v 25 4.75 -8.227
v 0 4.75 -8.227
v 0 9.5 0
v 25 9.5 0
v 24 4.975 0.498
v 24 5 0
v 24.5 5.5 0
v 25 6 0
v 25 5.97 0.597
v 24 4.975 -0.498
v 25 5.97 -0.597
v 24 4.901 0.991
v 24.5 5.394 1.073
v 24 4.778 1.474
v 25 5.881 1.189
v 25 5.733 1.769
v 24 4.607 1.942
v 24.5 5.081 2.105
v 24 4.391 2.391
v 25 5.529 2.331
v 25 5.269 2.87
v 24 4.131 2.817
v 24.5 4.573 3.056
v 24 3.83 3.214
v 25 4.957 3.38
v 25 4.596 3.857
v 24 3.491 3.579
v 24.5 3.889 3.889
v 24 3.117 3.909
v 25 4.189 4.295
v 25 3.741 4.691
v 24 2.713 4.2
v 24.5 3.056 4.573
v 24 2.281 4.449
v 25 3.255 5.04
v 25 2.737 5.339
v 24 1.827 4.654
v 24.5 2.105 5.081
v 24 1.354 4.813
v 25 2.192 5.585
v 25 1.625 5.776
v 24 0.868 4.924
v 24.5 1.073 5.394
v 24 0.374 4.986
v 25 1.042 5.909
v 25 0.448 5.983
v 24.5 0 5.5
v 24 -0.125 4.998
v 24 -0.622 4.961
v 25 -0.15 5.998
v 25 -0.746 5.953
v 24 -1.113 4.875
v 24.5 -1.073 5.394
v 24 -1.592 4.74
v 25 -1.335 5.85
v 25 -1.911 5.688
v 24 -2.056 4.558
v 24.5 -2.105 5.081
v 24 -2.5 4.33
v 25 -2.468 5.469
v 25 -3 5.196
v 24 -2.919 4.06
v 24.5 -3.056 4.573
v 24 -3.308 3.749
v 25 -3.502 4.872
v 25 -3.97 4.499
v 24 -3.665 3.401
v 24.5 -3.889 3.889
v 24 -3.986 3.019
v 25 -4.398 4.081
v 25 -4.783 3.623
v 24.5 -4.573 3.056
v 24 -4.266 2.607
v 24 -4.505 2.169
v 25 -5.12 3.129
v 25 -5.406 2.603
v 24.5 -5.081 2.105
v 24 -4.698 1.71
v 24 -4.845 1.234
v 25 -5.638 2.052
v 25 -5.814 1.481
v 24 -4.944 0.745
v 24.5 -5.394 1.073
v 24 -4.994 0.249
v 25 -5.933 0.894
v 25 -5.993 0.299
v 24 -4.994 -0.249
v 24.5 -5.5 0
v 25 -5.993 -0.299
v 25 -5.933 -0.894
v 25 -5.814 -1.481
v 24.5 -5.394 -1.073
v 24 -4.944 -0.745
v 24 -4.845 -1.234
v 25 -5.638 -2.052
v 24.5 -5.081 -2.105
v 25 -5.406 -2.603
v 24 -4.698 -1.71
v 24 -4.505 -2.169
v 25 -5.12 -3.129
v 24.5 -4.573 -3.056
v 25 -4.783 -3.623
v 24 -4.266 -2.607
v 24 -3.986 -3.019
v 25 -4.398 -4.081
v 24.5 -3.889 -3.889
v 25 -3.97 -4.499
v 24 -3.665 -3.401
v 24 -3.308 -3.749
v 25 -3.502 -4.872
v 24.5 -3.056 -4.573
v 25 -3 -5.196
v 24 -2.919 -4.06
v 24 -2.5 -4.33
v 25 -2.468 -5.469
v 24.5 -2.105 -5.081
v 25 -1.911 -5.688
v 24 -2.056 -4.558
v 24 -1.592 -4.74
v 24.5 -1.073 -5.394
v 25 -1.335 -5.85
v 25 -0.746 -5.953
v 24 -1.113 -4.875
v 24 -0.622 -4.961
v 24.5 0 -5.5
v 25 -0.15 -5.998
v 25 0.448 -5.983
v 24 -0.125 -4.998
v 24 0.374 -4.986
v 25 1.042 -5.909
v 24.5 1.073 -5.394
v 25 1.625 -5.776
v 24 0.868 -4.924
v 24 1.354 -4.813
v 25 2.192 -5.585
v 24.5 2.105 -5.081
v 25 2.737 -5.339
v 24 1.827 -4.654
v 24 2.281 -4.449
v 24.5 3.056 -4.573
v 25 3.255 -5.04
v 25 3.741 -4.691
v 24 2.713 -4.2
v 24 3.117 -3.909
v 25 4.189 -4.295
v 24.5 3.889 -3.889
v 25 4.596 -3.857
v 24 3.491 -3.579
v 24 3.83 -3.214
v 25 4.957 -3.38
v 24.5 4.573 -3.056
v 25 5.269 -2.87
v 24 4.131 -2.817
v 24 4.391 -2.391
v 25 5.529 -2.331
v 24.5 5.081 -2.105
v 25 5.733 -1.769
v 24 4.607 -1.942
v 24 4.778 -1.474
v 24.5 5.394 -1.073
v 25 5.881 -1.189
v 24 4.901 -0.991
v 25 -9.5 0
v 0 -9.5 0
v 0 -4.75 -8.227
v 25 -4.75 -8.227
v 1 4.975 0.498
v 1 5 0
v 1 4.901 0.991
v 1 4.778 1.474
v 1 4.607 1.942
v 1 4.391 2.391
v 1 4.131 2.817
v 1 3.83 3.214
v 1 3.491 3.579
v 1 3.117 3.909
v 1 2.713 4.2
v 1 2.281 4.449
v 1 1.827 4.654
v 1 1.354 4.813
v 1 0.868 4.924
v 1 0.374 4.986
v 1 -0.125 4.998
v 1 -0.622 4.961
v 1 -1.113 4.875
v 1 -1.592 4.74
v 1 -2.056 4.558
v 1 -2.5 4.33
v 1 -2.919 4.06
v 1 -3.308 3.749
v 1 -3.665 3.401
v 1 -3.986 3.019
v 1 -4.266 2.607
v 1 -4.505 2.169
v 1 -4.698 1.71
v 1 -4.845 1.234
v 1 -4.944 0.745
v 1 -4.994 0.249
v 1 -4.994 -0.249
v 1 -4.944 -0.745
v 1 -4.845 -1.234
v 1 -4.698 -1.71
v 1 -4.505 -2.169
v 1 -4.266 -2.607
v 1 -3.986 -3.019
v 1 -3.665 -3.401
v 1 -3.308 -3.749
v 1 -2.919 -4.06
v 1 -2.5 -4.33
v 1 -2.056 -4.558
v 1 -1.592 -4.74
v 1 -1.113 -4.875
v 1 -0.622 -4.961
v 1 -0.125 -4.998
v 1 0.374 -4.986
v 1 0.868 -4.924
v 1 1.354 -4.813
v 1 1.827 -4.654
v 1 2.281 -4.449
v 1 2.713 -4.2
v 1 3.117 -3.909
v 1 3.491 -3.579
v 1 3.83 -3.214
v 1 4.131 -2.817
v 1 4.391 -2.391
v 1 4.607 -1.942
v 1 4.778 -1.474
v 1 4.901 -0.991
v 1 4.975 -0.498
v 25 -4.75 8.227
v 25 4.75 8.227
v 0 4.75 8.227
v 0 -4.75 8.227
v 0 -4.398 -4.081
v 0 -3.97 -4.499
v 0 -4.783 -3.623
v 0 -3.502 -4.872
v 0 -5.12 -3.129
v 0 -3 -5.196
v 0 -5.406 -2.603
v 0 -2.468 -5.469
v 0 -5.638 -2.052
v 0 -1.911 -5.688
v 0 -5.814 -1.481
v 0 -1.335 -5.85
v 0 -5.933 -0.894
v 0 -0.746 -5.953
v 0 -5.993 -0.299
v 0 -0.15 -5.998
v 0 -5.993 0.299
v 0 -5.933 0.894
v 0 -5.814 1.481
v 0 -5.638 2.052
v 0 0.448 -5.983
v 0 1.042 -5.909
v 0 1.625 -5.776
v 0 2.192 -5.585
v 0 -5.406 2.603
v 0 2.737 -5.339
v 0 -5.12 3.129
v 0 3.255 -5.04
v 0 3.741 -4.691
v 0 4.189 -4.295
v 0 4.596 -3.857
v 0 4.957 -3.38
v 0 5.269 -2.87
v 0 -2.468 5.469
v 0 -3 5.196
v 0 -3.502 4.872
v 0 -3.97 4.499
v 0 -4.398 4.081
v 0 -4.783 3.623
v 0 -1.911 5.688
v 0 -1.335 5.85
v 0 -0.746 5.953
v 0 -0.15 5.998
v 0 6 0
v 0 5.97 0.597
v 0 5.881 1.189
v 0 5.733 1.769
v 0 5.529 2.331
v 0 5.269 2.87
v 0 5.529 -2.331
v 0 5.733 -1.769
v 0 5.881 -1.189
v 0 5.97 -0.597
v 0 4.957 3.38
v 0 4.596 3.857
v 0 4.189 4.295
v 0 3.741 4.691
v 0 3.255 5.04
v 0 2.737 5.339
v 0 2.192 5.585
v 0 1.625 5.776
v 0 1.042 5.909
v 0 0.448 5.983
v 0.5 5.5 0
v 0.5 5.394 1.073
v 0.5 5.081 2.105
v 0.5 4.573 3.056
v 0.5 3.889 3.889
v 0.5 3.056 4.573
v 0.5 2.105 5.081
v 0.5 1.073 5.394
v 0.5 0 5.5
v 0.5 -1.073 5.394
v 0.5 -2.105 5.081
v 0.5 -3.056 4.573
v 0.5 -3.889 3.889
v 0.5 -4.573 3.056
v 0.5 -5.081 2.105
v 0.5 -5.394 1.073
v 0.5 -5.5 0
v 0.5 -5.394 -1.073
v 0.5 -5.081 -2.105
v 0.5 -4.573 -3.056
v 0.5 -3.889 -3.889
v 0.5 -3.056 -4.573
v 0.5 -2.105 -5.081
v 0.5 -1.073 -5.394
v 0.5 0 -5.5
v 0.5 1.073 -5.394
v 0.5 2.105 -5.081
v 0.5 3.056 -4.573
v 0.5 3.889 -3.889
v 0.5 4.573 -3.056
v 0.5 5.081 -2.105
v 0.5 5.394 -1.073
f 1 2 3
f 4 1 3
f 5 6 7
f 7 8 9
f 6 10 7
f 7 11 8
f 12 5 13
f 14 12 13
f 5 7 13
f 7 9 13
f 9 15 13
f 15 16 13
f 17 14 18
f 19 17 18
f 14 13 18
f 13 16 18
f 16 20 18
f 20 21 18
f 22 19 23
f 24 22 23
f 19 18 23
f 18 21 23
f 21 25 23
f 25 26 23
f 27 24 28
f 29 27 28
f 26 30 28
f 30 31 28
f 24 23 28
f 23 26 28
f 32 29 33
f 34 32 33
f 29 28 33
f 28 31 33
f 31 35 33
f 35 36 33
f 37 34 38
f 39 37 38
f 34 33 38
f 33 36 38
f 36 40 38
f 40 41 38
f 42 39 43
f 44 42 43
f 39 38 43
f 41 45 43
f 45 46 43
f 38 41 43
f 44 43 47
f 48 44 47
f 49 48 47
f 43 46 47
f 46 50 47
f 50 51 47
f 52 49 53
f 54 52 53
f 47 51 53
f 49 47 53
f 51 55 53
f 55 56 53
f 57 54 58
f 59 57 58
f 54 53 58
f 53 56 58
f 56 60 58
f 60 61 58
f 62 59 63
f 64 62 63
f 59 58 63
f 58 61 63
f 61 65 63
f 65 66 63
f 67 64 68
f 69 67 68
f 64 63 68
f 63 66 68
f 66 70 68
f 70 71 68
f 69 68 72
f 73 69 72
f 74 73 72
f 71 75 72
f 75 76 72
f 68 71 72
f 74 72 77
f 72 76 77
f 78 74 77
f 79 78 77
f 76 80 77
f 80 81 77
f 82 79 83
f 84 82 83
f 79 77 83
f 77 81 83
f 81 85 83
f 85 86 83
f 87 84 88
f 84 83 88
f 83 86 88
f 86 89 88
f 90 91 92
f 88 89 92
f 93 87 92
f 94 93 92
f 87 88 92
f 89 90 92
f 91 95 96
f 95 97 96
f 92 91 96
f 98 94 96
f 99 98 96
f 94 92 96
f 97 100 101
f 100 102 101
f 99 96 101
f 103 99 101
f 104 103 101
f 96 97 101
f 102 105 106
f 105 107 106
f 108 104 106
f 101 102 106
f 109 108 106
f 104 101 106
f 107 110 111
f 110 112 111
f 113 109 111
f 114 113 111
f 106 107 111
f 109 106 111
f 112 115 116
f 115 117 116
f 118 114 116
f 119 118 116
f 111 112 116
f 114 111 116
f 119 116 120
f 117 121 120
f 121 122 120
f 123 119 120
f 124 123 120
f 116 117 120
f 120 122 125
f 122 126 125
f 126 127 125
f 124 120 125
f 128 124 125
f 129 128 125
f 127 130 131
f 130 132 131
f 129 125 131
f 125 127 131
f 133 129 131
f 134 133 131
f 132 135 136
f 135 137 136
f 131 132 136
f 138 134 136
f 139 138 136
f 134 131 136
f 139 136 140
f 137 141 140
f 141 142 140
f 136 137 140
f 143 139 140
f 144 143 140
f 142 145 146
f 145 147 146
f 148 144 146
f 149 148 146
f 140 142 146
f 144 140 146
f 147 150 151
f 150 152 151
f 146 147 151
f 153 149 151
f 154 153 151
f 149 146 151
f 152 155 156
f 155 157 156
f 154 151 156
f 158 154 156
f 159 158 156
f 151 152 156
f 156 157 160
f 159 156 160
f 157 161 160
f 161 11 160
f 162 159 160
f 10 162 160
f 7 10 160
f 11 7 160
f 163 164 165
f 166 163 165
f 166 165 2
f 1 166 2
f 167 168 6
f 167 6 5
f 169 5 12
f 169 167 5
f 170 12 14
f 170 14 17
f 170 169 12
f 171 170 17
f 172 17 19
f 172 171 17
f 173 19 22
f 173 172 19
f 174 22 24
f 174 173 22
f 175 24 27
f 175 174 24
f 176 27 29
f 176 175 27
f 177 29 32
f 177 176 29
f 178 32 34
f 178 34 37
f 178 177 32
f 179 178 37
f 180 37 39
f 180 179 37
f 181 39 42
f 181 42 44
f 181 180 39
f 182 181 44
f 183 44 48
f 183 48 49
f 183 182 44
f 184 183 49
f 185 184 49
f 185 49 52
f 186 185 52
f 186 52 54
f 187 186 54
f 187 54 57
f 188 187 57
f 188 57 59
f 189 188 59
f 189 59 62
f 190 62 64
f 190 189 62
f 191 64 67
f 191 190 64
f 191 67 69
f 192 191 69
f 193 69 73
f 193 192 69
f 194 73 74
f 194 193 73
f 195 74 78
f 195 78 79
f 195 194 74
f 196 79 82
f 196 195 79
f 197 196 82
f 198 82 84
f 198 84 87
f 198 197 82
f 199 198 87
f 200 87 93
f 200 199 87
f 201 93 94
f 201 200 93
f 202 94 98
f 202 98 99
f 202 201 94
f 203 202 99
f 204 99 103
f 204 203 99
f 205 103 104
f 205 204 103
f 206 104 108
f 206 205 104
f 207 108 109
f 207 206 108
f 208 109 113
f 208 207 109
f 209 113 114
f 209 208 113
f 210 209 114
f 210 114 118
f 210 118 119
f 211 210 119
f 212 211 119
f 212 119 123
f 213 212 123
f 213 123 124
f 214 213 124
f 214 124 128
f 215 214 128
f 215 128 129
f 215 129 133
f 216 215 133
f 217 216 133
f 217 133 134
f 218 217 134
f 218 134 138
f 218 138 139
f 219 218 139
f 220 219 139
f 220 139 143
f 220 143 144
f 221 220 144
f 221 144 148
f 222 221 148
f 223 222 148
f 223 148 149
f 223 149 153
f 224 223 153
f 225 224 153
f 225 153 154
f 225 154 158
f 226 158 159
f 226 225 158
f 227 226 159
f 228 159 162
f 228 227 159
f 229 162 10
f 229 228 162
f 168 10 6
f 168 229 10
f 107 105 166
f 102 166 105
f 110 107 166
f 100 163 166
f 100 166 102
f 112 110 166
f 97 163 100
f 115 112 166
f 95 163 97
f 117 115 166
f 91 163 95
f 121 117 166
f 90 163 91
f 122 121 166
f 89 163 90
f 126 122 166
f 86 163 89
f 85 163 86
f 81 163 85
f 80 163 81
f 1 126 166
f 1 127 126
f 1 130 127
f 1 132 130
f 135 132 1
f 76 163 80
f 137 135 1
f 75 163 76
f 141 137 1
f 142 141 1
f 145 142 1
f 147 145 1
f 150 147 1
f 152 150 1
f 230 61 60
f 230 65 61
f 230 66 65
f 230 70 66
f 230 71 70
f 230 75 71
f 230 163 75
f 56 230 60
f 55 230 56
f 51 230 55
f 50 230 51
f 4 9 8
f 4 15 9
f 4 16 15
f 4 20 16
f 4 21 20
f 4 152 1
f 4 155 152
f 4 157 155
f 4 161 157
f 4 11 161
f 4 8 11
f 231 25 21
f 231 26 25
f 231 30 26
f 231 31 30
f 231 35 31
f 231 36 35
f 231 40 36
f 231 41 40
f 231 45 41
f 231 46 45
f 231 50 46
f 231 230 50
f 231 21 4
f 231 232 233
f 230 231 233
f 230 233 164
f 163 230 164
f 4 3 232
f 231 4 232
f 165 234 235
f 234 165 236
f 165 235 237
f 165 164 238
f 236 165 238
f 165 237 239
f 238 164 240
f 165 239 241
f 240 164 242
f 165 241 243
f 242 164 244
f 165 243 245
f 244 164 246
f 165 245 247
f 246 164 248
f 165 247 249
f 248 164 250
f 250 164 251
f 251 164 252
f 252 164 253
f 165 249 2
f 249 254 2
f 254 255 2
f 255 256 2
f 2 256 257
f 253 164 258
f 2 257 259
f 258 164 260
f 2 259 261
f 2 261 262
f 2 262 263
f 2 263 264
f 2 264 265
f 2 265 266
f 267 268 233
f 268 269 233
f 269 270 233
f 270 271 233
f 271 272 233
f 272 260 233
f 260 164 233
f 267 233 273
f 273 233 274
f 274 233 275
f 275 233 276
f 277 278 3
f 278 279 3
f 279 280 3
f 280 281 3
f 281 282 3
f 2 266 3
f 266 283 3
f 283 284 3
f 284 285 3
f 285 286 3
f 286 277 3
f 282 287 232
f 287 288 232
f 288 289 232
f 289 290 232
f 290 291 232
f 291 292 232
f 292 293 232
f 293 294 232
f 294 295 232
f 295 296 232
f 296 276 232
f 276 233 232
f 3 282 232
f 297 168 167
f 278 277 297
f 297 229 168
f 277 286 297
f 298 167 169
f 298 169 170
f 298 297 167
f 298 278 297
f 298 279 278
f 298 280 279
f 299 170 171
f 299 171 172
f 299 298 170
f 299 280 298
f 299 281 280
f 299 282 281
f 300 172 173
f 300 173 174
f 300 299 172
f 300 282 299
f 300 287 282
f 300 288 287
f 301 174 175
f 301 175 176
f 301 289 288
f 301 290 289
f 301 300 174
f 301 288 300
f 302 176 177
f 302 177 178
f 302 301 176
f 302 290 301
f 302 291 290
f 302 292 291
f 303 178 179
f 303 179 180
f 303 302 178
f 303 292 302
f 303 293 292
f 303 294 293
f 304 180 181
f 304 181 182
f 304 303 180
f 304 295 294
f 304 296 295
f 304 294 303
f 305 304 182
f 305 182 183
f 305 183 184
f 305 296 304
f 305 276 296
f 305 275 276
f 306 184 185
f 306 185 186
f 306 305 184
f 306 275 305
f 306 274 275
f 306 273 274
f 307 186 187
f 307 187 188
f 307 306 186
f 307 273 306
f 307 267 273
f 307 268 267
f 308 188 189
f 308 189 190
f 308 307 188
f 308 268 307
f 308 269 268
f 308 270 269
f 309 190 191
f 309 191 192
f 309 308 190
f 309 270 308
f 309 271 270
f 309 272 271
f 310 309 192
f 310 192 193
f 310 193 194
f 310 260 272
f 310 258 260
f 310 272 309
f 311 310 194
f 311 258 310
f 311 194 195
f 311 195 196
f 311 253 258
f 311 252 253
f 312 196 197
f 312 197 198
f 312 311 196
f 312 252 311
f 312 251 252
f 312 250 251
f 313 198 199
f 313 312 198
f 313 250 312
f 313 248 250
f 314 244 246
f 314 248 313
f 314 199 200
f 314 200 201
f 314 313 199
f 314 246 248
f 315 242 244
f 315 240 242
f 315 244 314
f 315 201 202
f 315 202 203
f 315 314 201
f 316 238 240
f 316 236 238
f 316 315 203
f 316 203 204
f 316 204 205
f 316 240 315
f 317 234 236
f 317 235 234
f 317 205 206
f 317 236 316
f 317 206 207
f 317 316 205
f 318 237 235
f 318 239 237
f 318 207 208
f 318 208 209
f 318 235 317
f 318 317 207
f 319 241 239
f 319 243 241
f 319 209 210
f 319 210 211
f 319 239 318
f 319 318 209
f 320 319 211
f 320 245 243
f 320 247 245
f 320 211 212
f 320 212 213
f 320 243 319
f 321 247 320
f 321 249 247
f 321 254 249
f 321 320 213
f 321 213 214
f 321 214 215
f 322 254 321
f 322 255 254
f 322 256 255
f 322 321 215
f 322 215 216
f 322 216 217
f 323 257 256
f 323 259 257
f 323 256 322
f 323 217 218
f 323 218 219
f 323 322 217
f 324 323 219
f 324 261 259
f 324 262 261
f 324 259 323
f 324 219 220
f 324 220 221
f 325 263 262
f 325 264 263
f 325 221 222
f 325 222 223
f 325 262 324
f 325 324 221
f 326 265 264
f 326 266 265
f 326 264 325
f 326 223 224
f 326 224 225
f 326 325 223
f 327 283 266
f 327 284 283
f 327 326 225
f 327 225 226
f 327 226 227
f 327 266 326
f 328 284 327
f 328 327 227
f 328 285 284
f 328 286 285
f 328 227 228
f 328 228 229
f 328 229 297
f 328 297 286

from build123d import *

# Parameters (mm, degrees)
F0_R     = 5
F1_DEPTH = 25
F2_SIZE  = 1


with BuildPart() as f1:
    # F0 (on Right) → F1 (new body)
    with BuildSketch(Plane.YZ):
        Polygon((4.75, 8.227241), (-4.75, 8.227241), (-9.5, 0), (-4.75, -8.227241), (4.75, -8.227241), (9.5, 0), align=None)
        Circle(F0_R, mode=Mode.SUBTRACT)
    extrude(amount=F1_DEPTH)

    # F2
    f2_edges = [f1.edges().sort_by_distance(p)[0] for p in [
        (0, -5, 0),
        (25, -5, 0),
    ]]
    chamfer(f2_edges, length=F2_SIZE)


solid = f1.part
